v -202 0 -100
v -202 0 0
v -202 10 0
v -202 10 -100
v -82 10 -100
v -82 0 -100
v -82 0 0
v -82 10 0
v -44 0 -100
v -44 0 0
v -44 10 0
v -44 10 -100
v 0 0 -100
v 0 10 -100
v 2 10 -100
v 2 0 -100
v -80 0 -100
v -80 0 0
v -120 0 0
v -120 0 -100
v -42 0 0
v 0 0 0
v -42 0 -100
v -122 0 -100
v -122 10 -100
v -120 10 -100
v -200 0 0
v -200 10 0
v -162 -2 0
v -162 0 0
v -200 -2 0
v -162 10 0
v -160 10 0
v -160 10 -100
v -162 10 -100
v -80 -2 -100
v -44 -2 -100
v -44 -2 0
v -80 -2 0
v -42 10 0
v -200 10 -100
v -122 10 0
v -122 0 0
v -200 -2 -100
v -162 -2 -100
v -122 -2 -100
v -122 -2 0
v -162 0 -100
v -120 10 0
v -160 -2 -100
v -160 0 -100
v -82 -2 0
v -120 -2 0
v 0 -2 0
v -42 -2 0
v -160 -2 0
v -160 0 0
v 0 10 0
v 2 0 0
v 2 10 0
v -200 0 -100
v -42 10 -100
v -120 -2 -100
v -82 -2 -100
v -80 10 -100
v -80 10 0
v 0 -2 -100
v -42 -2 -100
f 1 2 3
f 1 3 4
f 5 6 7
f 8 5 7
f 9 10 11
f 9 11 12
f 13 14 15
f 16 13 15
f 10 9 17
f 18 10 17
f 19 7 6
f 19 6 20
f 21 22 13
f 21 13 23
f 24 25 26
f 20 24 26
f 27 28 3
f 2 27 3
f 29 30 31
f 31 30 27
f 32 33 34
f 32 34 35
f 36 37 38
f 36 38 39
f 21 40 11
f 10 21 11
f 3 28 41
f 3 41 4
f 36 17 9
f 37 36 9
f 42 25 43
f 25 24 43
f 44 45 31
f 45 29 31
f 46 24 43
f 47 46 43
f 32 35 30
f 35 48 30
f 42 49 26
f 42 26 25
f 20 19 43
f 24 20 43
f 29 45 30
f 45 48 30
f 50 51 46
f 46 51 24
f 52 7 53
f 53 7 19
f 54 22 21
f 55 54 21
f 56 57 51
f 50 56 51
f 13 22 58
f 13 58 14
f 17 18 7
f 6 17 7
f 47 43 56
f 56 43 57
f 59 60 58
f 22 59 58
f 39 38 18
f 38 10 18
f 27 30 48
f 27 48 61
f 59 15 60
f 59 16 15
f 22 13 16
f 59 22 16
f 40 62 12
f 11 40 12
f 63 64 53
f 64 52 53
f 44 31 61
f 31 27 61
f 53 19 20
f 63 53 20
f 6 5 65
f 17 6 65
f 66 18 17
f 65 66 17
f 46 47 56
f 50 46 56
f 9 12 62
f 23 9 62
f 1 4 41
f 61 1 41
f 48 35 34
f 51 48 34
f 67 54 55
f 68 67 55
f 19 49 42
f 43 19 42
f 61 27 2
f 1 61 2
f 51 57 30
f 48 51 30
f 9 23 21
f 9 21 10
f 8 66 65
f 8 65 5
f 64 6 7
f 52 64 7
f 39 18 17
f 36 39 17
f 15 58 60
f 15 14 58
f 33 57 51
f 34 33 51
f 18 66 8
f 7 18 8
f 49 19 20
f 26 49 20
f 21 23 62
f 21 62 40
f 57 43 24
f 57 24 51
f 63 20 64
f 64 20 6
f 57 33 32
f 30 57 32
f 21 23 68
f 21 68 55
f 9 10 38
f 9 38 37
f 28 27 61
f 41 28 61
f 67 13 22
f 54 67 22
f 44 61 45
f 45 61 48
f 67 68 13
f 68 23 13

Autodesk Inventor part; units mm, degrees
ref_plane "YZ Plane" through (0, 0, 0) normal (1, 0, 0) x (0, 1, 0)
ref_plane "XZ Plane" through (0, 0, 0) normal (0, 1, 0) x (-1, 0, 0)
ref_plane "XY Plane" through (0, 0, 0) normal (0, 0, 1) x (1, 0, 0)
sketch "Esquisse1" plane through (0, 0, 0) normal (0, 1, 0) x (-1, 0, 0)
  line L0 (0, 0) -> (200, 0)
  line L1 (200, 0) -> (200, -100)
  line L2 (200, -100) -> (0, -100)
  line L3 (0, -100) -> (0, 0)
  line L4 (162, 0) -> (160, 0)
  line L5 (160, 0) -> (160, -100)
  line L6 (160, -100) -> (162, -100)
  line L7 (162, -100) -> (162, 0)
  line L8 (122, 0) -> (120, 0)
  line L9 (120, 0) -> (120, -100)
  line L10 (120, -100) -> (122, -100)
  line L11 (122, -100) -> (122, 0)
  line L12 (82, 0) -> (80, 0)
  line L13 (80, 0) -> (80, -100)
  line L14 (80, -100) -> (82, -100)
  line L15 (82, -100) -> (82, 0)
  line L16 (42, 0) -> (44, 0)
  line L17 (44, 0) -> (44, -100)
  line L18 (44, -100) -> (42, -100)
  line L19 (42, -100) -> (42, 0)
  line L20 (200, 0) -> (0, 0)
  line L21 (0, 0) -> (0, -100)
  line L22 (0, -100) -> (200, -100)
  line L23 (200, -100) -> (200, 0)
  line L24 (200, 0) -> (202, 0)
  line L25 (202, 0) -> (202, -100)
  line L26 (202, -100) -> (200, -100)
  line L27 (200, -100) -> (200, 0)
  dimension "d0" = 100
  dimension "d1" = 200
  dimension "d2" = 38
  dimension "d3" = 2
  dimension "d4" = 38
  dimension "d5" = 2
  dimension "d6" = 38
  dimension "d7" = 2
  dimension "d8" = 38
  dimension "d9" = 2
  dimension "d14" = 2
  dimension "d15" = 100
extrude "Extrusion1" add sketch "Esquisse1" along normal blind 10 contours L0 L17 L2 L19 | L0 L15 L2 L13 | L0 L11 L2 L9 | L0 L7 L2 L5
extrude "Extrusion2" add sketch "Esquisse1" against normal blind 2 contours L0 L19 L2 L3 | L0 L13 L2 L17 | L0 L9 L2 L15 | L0 L5 L2 L11 | L0 L1 L2 L7
extrude "Extrusion3" add sketch "Esquisse1" along normal blind 10 contours L24 L25 L26 L1
sketch "Esquisse2" plane through (0, 0, 0) normal (0, 1, 0) x (1, 0, 0)
  line L0 (0, 100) -> (2, 100)
  line L1 (2, 100) -> (2, 0)
  line L2 (2, 0) -> (0, 0)
  line L3 (0, 0) -> (0, 100)
  dimension "d18" = 100
  dimension "d19" = 2
extrude "Extrusion4" add sketch "Esquisse2" along normal blind 10
properties part number "toboggan"
